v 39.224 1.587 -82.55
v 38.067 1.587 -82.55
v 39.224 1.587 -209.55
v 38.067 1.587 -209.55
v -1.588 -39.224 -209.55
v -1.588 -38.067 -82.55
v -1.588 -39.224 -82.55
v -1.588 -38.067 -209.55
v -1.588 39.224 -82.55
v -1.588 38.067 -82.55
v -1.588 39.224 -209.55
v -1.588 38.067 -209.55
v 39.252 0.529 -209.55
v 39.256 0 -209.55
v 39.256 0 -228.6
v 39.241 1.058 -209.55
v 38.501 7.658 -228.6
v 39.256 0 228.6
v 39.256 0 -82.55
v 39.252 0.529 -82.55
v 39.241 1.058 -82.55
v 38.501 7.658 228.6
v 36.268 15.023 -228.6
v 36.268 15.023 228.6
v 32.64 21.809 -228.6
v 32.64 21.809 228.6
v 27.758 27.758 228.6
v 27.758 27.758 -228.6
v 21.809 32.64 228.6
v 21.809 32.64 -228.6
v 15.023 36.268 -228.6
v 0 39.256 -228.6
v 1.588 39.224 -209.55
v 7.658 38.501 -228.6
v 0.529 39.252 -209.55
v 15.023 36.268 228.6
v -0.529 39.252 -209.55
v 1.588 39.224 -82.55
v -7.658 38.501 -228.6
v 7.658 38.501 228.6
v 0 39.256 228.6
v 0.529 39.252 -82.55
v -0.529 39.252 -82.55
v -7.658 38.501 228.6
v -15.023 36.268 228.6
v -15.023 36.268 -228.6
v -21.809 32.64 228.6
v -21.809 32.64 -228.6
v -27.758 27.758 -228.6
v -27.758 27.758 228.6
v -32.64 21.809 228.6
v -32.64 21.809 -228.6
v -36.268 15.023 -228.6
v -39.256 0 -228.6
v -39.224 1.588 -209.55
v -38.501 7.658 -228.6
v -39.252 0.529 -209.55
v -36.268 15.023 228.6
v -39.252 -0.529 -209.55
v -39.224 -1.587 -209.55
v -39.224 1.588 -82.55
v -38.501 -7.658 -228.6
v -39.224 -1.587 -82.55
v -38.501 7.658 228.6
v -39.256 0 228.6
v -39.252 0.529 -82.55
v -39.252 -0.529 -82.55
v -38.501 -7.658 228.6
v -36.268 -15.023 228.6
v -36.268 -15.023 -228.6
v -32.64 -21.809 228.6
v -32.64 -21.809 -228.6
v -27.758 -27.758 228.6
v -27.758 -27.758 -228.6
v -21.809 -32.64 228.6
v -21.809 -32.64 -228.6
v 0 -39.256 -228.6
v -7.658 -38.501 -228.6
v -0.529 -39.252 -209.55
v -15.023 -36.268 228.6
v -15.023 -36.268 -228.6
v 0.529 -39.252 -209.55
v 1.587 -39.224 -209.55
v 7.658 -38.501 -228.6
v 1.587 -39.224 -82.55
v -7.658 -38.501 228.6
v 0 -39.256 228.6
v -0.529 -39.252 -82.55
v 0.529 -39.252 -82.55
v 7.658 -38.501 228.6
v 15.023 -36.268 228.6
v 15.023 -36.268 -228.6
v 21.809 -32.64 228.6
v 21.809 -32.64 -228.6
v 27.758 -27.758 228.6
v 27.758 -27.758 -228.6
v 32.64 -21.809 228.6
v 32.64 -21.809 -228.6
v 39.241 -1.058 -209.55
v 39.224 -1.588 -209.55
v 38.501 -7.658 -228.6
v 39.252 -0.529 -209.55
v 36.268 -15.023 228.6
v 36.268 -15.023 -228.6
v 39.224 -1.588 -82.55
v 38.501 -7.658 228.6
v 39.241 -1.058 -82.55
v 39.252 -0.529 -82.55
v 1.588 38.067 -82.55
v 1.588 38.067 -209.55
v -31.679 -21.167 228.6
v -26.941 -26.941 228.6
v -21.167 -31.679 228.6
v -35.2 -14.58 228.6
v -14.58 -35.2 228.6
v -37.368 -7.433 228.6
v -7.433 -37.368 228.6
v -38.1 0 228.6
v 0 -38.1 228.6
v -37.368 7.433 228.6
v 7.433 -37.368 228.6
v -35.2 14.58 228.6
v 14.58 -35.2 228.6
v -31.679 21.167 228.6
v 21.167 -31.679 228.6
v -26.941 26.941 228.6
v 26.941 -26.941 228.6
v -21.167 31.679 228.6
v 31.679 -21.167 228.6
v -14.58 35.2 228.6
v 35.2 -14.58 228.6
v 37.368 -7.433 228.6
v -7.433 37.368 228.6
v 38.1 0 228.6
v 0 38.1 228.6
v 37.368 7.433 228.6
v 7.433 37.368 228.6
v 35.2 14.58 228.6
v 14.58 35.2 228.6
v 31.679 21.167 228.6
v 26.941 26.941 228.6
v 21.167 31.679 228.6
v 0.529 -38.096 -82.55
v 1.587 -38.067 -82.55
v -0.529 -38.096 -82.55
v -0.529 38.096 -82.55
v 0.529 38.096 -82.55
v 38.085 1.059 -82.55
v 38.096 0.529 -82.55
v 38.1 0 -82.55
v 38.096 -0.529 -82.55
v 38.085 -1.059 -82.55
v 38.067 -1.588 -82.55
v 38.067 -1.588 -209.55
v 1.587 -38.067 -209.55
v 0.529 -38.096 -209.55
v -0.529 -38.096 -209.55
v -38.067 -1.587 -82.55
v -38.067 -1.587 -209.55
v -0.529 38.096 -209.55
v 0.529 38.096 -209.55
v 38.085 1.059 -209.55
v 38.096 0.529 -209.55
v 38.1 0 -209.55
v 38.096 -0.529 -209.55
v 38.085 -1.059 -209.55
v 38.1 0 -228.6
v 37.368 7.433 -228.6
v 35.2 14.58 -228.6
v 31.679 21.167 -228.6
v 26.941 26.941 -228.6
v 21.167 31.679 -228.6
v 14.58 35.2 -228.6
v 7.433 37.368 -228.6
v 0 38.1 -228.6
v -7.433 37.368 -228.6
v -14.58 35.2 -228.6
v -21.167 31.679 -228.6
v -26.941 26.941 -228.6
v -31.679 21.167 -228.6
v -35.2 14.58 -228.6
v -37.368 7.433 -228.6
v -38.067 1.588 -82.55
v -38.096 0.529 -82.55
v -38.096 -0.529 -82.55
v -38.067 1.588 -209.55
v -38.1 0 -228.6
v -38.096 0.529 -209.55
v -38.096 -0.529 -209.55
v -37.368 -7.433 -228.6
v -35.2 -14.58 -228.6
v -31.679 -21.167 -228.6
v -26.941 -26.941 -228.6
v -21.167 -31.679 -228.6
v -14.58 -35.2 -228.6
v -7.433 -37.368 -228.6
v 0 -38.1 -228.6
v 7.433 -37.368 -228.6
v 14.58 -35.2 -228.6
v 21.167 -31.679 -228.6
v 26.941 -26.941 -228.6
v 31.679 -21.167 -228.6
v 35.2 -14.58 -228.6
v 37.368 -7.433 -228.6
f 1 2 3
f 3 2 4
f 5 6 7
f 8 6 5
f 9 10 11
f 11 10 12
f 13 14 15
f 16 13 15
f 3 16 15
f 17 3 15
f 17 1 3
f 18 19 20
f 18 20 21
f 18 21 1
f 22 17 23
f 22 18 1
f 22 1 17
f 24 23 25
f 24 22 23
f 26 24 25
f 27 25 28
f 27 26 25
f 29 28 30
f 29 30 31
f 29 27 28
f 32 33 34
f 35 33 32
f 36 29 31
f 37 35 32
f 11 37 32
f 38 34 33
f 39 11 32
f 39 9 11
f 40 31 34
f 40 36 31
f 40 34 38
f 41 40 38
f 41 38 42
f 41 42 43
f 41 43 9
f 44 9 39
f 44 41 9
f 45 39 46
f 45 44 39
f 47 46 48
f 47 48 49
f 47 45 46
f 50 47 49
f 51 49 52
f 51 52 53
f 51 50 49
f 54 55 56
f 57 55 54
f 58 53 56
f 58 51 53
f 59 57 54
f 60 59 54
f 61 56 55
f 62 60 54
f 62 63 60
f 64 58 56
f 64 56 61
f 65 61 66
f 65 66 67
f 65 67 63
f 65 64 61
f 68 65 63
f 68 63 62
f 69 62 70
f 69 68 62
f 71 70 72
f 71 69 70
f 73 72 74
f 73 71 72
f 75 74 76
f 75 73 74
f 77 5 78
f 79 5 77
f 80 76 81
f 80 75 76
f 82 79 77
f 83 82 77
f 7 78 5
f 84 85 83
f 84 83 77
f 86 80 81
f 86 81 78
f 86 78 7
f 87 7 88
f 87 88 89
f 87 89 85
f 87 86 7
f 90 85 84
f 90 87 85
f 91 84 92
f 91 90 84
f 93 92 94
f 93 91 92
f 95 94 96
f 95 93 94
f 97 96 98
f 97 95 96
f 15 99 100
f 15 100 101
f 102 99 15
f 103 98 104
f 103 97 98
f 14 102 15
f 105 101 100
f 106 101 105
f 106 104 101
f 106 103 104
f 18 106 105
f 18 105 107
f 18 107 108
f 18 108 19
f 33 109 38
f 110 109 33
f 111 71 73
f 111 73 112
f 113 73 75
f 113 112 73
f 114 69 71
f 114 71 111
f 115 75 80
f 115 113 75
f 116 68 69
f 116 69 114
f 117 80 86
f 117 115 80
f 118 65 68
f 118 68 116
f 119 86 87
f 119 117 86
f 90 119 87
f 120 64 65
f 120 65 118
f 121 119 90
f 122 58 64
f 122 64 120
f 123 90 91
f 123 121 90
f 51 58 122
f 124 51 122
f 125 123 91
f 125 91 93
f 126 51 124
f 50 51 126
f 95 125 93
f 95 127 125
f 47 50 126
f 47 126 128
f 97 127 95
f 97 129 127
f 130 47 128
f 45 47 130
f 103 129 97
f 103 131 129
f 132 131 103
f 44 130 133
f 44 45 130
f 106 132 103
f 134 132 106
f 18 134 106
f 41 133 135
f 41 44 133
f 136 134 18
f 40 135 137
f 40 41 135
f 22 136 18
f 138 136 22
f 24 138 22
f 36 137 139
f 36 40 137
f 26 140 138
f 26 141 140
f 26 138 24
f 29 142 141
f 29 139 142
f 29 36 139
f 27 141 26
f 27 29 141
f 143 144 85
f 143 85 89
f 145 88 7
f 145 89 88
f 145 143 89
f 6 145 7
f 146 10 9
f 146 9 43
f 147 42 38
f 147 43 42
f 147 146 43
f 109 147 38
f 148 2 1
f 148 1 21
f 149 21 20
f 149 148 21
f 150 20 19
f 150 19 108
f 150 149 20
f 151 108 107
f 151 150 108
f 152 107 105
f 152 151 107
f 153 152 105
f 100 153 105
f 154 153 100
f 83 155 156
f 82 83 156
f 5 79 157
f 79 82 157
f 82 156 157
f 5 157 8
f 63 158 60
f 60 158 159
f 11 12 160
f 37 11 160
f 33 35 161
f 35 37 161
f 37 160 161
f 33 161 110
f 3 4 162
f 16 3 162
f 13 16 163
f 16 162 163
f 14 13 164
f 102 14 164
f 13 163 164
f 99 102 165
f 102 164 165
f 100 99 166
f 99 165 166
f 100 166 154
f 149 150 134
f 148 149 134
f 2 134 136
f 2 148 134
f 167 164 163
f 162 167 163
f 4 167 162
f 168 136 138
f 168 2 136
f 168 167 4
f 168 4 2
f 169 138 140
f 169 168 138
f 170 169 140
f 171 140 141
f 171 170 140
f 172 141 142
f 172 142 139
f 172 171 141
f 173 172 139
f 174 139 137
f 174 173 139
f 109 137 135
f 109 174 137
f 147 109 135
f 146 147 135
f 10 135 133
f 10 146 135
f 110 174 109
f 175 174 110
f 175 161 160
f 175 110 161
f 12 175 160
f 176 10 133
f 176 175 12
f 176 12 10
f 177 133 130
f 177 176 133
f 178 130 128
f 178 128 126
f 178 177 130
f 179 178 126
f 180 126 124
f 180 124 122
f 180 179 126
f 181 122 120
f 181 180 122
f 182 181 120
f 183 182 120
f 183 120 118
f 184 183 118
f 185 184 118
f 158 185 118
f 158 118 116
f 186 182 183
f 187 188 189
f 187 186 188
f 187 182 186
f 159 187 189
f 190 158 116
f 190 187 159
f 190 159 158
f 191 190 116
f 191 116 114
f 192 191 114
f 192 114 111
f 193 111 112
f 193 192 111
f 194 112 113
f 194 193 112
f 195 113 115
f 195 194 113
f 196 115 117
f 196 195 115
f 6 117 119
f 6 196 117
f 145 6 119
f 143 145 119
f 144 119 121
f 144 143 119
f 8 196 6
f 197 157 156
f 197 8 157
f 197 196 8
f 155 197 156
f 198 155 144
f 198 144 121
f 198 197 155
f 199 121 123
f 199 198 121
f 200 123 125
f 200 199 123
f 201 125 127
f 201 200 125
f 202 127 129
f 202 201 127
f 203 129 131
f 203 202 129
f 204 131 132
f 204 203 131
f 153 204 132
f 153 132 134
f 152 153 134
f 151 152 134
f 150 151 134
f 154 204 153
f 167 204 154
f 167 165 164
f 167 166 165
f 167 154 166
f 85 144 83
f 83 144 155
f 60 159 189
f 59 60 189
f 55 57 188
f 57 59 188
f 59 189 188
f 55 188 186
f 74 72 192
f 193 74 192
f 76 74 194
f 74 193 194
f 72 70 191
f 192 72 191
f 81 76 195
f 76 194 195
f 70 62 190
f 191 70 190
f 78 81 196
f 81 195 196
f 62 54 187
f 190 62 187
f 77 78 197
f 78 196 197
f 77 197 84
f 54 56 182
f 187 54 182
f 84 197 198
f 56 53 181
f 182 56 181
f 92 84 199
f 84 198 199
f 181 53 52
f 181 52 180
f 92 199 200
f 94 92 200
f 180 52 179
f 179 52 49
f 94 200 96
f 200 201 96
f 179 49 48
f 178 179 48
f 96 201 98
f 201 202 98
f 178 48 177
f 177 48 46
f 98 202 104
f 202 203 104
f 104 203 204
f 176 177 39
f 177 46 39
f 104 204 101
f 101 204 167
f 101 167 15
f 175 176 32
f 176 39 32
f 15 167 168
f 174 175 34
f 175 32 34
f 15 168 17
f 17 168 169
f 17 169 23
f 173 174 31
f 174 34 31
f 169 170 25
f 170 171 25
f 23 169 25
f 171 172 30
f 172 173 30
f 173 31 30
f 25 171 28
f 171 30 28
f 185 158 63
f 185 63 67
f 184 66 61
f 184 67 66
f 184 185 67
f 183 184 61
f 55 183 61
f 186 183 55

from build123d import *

# Parameters (mm, degrees)
SKETCH1_R           = 39.2557
SKETCH1_R_2         = 38.1
BOSS_EXTRUDE1_DEPTH = 228.6
SKETCH3_W           = 3.175
SKETCH3_H           = 127
CUT_EXTRUDE1_DEPTH  = 236.24451102
CIRPATTERN1_COUNT   = 4


with BuildPart() as part:
    # Sketch1 → Boss-Extrude1 (new, symmetric)
    with BuildSketch(Plane.XY):
        Circle(SKETCH1_R)
        Circle(SKETCH1_R_2, mode=Mode.SUBTRACT)
    extrude(amount=BOSS_EXTRUDE1_DEPTH, both=True)

    # Sketch3 → Cut-Extrude1 (cut, through all)
    with BuildSketch(Plane(origin=(0, 0, 0), x_dir=(1, 0, 0), z_dir=(0, 1, 0))):
        with Locations((0, 146.05)):
            Rectangle(SKETCH3_W, SKETCH3_H)
    cut_extrude1 = extrude(amount=CUT_EXTRUDE1_DEPTH, mode=Mode.SUBTRACT)

    # CirPattern1: Cut-Extrude1 ×4 about axis
    cirpattern1_axis = Axis((0, 0, 0), (0, 0, 1))
    for i in range(1, CIRPATTERN1_COUNT):
        add(cut_extrude1.rotate(cirpattern1_axis, i * 360 / CIRPATTERN1_COUNT), mode=Mode.SUBTRACT)


solid = part.part
